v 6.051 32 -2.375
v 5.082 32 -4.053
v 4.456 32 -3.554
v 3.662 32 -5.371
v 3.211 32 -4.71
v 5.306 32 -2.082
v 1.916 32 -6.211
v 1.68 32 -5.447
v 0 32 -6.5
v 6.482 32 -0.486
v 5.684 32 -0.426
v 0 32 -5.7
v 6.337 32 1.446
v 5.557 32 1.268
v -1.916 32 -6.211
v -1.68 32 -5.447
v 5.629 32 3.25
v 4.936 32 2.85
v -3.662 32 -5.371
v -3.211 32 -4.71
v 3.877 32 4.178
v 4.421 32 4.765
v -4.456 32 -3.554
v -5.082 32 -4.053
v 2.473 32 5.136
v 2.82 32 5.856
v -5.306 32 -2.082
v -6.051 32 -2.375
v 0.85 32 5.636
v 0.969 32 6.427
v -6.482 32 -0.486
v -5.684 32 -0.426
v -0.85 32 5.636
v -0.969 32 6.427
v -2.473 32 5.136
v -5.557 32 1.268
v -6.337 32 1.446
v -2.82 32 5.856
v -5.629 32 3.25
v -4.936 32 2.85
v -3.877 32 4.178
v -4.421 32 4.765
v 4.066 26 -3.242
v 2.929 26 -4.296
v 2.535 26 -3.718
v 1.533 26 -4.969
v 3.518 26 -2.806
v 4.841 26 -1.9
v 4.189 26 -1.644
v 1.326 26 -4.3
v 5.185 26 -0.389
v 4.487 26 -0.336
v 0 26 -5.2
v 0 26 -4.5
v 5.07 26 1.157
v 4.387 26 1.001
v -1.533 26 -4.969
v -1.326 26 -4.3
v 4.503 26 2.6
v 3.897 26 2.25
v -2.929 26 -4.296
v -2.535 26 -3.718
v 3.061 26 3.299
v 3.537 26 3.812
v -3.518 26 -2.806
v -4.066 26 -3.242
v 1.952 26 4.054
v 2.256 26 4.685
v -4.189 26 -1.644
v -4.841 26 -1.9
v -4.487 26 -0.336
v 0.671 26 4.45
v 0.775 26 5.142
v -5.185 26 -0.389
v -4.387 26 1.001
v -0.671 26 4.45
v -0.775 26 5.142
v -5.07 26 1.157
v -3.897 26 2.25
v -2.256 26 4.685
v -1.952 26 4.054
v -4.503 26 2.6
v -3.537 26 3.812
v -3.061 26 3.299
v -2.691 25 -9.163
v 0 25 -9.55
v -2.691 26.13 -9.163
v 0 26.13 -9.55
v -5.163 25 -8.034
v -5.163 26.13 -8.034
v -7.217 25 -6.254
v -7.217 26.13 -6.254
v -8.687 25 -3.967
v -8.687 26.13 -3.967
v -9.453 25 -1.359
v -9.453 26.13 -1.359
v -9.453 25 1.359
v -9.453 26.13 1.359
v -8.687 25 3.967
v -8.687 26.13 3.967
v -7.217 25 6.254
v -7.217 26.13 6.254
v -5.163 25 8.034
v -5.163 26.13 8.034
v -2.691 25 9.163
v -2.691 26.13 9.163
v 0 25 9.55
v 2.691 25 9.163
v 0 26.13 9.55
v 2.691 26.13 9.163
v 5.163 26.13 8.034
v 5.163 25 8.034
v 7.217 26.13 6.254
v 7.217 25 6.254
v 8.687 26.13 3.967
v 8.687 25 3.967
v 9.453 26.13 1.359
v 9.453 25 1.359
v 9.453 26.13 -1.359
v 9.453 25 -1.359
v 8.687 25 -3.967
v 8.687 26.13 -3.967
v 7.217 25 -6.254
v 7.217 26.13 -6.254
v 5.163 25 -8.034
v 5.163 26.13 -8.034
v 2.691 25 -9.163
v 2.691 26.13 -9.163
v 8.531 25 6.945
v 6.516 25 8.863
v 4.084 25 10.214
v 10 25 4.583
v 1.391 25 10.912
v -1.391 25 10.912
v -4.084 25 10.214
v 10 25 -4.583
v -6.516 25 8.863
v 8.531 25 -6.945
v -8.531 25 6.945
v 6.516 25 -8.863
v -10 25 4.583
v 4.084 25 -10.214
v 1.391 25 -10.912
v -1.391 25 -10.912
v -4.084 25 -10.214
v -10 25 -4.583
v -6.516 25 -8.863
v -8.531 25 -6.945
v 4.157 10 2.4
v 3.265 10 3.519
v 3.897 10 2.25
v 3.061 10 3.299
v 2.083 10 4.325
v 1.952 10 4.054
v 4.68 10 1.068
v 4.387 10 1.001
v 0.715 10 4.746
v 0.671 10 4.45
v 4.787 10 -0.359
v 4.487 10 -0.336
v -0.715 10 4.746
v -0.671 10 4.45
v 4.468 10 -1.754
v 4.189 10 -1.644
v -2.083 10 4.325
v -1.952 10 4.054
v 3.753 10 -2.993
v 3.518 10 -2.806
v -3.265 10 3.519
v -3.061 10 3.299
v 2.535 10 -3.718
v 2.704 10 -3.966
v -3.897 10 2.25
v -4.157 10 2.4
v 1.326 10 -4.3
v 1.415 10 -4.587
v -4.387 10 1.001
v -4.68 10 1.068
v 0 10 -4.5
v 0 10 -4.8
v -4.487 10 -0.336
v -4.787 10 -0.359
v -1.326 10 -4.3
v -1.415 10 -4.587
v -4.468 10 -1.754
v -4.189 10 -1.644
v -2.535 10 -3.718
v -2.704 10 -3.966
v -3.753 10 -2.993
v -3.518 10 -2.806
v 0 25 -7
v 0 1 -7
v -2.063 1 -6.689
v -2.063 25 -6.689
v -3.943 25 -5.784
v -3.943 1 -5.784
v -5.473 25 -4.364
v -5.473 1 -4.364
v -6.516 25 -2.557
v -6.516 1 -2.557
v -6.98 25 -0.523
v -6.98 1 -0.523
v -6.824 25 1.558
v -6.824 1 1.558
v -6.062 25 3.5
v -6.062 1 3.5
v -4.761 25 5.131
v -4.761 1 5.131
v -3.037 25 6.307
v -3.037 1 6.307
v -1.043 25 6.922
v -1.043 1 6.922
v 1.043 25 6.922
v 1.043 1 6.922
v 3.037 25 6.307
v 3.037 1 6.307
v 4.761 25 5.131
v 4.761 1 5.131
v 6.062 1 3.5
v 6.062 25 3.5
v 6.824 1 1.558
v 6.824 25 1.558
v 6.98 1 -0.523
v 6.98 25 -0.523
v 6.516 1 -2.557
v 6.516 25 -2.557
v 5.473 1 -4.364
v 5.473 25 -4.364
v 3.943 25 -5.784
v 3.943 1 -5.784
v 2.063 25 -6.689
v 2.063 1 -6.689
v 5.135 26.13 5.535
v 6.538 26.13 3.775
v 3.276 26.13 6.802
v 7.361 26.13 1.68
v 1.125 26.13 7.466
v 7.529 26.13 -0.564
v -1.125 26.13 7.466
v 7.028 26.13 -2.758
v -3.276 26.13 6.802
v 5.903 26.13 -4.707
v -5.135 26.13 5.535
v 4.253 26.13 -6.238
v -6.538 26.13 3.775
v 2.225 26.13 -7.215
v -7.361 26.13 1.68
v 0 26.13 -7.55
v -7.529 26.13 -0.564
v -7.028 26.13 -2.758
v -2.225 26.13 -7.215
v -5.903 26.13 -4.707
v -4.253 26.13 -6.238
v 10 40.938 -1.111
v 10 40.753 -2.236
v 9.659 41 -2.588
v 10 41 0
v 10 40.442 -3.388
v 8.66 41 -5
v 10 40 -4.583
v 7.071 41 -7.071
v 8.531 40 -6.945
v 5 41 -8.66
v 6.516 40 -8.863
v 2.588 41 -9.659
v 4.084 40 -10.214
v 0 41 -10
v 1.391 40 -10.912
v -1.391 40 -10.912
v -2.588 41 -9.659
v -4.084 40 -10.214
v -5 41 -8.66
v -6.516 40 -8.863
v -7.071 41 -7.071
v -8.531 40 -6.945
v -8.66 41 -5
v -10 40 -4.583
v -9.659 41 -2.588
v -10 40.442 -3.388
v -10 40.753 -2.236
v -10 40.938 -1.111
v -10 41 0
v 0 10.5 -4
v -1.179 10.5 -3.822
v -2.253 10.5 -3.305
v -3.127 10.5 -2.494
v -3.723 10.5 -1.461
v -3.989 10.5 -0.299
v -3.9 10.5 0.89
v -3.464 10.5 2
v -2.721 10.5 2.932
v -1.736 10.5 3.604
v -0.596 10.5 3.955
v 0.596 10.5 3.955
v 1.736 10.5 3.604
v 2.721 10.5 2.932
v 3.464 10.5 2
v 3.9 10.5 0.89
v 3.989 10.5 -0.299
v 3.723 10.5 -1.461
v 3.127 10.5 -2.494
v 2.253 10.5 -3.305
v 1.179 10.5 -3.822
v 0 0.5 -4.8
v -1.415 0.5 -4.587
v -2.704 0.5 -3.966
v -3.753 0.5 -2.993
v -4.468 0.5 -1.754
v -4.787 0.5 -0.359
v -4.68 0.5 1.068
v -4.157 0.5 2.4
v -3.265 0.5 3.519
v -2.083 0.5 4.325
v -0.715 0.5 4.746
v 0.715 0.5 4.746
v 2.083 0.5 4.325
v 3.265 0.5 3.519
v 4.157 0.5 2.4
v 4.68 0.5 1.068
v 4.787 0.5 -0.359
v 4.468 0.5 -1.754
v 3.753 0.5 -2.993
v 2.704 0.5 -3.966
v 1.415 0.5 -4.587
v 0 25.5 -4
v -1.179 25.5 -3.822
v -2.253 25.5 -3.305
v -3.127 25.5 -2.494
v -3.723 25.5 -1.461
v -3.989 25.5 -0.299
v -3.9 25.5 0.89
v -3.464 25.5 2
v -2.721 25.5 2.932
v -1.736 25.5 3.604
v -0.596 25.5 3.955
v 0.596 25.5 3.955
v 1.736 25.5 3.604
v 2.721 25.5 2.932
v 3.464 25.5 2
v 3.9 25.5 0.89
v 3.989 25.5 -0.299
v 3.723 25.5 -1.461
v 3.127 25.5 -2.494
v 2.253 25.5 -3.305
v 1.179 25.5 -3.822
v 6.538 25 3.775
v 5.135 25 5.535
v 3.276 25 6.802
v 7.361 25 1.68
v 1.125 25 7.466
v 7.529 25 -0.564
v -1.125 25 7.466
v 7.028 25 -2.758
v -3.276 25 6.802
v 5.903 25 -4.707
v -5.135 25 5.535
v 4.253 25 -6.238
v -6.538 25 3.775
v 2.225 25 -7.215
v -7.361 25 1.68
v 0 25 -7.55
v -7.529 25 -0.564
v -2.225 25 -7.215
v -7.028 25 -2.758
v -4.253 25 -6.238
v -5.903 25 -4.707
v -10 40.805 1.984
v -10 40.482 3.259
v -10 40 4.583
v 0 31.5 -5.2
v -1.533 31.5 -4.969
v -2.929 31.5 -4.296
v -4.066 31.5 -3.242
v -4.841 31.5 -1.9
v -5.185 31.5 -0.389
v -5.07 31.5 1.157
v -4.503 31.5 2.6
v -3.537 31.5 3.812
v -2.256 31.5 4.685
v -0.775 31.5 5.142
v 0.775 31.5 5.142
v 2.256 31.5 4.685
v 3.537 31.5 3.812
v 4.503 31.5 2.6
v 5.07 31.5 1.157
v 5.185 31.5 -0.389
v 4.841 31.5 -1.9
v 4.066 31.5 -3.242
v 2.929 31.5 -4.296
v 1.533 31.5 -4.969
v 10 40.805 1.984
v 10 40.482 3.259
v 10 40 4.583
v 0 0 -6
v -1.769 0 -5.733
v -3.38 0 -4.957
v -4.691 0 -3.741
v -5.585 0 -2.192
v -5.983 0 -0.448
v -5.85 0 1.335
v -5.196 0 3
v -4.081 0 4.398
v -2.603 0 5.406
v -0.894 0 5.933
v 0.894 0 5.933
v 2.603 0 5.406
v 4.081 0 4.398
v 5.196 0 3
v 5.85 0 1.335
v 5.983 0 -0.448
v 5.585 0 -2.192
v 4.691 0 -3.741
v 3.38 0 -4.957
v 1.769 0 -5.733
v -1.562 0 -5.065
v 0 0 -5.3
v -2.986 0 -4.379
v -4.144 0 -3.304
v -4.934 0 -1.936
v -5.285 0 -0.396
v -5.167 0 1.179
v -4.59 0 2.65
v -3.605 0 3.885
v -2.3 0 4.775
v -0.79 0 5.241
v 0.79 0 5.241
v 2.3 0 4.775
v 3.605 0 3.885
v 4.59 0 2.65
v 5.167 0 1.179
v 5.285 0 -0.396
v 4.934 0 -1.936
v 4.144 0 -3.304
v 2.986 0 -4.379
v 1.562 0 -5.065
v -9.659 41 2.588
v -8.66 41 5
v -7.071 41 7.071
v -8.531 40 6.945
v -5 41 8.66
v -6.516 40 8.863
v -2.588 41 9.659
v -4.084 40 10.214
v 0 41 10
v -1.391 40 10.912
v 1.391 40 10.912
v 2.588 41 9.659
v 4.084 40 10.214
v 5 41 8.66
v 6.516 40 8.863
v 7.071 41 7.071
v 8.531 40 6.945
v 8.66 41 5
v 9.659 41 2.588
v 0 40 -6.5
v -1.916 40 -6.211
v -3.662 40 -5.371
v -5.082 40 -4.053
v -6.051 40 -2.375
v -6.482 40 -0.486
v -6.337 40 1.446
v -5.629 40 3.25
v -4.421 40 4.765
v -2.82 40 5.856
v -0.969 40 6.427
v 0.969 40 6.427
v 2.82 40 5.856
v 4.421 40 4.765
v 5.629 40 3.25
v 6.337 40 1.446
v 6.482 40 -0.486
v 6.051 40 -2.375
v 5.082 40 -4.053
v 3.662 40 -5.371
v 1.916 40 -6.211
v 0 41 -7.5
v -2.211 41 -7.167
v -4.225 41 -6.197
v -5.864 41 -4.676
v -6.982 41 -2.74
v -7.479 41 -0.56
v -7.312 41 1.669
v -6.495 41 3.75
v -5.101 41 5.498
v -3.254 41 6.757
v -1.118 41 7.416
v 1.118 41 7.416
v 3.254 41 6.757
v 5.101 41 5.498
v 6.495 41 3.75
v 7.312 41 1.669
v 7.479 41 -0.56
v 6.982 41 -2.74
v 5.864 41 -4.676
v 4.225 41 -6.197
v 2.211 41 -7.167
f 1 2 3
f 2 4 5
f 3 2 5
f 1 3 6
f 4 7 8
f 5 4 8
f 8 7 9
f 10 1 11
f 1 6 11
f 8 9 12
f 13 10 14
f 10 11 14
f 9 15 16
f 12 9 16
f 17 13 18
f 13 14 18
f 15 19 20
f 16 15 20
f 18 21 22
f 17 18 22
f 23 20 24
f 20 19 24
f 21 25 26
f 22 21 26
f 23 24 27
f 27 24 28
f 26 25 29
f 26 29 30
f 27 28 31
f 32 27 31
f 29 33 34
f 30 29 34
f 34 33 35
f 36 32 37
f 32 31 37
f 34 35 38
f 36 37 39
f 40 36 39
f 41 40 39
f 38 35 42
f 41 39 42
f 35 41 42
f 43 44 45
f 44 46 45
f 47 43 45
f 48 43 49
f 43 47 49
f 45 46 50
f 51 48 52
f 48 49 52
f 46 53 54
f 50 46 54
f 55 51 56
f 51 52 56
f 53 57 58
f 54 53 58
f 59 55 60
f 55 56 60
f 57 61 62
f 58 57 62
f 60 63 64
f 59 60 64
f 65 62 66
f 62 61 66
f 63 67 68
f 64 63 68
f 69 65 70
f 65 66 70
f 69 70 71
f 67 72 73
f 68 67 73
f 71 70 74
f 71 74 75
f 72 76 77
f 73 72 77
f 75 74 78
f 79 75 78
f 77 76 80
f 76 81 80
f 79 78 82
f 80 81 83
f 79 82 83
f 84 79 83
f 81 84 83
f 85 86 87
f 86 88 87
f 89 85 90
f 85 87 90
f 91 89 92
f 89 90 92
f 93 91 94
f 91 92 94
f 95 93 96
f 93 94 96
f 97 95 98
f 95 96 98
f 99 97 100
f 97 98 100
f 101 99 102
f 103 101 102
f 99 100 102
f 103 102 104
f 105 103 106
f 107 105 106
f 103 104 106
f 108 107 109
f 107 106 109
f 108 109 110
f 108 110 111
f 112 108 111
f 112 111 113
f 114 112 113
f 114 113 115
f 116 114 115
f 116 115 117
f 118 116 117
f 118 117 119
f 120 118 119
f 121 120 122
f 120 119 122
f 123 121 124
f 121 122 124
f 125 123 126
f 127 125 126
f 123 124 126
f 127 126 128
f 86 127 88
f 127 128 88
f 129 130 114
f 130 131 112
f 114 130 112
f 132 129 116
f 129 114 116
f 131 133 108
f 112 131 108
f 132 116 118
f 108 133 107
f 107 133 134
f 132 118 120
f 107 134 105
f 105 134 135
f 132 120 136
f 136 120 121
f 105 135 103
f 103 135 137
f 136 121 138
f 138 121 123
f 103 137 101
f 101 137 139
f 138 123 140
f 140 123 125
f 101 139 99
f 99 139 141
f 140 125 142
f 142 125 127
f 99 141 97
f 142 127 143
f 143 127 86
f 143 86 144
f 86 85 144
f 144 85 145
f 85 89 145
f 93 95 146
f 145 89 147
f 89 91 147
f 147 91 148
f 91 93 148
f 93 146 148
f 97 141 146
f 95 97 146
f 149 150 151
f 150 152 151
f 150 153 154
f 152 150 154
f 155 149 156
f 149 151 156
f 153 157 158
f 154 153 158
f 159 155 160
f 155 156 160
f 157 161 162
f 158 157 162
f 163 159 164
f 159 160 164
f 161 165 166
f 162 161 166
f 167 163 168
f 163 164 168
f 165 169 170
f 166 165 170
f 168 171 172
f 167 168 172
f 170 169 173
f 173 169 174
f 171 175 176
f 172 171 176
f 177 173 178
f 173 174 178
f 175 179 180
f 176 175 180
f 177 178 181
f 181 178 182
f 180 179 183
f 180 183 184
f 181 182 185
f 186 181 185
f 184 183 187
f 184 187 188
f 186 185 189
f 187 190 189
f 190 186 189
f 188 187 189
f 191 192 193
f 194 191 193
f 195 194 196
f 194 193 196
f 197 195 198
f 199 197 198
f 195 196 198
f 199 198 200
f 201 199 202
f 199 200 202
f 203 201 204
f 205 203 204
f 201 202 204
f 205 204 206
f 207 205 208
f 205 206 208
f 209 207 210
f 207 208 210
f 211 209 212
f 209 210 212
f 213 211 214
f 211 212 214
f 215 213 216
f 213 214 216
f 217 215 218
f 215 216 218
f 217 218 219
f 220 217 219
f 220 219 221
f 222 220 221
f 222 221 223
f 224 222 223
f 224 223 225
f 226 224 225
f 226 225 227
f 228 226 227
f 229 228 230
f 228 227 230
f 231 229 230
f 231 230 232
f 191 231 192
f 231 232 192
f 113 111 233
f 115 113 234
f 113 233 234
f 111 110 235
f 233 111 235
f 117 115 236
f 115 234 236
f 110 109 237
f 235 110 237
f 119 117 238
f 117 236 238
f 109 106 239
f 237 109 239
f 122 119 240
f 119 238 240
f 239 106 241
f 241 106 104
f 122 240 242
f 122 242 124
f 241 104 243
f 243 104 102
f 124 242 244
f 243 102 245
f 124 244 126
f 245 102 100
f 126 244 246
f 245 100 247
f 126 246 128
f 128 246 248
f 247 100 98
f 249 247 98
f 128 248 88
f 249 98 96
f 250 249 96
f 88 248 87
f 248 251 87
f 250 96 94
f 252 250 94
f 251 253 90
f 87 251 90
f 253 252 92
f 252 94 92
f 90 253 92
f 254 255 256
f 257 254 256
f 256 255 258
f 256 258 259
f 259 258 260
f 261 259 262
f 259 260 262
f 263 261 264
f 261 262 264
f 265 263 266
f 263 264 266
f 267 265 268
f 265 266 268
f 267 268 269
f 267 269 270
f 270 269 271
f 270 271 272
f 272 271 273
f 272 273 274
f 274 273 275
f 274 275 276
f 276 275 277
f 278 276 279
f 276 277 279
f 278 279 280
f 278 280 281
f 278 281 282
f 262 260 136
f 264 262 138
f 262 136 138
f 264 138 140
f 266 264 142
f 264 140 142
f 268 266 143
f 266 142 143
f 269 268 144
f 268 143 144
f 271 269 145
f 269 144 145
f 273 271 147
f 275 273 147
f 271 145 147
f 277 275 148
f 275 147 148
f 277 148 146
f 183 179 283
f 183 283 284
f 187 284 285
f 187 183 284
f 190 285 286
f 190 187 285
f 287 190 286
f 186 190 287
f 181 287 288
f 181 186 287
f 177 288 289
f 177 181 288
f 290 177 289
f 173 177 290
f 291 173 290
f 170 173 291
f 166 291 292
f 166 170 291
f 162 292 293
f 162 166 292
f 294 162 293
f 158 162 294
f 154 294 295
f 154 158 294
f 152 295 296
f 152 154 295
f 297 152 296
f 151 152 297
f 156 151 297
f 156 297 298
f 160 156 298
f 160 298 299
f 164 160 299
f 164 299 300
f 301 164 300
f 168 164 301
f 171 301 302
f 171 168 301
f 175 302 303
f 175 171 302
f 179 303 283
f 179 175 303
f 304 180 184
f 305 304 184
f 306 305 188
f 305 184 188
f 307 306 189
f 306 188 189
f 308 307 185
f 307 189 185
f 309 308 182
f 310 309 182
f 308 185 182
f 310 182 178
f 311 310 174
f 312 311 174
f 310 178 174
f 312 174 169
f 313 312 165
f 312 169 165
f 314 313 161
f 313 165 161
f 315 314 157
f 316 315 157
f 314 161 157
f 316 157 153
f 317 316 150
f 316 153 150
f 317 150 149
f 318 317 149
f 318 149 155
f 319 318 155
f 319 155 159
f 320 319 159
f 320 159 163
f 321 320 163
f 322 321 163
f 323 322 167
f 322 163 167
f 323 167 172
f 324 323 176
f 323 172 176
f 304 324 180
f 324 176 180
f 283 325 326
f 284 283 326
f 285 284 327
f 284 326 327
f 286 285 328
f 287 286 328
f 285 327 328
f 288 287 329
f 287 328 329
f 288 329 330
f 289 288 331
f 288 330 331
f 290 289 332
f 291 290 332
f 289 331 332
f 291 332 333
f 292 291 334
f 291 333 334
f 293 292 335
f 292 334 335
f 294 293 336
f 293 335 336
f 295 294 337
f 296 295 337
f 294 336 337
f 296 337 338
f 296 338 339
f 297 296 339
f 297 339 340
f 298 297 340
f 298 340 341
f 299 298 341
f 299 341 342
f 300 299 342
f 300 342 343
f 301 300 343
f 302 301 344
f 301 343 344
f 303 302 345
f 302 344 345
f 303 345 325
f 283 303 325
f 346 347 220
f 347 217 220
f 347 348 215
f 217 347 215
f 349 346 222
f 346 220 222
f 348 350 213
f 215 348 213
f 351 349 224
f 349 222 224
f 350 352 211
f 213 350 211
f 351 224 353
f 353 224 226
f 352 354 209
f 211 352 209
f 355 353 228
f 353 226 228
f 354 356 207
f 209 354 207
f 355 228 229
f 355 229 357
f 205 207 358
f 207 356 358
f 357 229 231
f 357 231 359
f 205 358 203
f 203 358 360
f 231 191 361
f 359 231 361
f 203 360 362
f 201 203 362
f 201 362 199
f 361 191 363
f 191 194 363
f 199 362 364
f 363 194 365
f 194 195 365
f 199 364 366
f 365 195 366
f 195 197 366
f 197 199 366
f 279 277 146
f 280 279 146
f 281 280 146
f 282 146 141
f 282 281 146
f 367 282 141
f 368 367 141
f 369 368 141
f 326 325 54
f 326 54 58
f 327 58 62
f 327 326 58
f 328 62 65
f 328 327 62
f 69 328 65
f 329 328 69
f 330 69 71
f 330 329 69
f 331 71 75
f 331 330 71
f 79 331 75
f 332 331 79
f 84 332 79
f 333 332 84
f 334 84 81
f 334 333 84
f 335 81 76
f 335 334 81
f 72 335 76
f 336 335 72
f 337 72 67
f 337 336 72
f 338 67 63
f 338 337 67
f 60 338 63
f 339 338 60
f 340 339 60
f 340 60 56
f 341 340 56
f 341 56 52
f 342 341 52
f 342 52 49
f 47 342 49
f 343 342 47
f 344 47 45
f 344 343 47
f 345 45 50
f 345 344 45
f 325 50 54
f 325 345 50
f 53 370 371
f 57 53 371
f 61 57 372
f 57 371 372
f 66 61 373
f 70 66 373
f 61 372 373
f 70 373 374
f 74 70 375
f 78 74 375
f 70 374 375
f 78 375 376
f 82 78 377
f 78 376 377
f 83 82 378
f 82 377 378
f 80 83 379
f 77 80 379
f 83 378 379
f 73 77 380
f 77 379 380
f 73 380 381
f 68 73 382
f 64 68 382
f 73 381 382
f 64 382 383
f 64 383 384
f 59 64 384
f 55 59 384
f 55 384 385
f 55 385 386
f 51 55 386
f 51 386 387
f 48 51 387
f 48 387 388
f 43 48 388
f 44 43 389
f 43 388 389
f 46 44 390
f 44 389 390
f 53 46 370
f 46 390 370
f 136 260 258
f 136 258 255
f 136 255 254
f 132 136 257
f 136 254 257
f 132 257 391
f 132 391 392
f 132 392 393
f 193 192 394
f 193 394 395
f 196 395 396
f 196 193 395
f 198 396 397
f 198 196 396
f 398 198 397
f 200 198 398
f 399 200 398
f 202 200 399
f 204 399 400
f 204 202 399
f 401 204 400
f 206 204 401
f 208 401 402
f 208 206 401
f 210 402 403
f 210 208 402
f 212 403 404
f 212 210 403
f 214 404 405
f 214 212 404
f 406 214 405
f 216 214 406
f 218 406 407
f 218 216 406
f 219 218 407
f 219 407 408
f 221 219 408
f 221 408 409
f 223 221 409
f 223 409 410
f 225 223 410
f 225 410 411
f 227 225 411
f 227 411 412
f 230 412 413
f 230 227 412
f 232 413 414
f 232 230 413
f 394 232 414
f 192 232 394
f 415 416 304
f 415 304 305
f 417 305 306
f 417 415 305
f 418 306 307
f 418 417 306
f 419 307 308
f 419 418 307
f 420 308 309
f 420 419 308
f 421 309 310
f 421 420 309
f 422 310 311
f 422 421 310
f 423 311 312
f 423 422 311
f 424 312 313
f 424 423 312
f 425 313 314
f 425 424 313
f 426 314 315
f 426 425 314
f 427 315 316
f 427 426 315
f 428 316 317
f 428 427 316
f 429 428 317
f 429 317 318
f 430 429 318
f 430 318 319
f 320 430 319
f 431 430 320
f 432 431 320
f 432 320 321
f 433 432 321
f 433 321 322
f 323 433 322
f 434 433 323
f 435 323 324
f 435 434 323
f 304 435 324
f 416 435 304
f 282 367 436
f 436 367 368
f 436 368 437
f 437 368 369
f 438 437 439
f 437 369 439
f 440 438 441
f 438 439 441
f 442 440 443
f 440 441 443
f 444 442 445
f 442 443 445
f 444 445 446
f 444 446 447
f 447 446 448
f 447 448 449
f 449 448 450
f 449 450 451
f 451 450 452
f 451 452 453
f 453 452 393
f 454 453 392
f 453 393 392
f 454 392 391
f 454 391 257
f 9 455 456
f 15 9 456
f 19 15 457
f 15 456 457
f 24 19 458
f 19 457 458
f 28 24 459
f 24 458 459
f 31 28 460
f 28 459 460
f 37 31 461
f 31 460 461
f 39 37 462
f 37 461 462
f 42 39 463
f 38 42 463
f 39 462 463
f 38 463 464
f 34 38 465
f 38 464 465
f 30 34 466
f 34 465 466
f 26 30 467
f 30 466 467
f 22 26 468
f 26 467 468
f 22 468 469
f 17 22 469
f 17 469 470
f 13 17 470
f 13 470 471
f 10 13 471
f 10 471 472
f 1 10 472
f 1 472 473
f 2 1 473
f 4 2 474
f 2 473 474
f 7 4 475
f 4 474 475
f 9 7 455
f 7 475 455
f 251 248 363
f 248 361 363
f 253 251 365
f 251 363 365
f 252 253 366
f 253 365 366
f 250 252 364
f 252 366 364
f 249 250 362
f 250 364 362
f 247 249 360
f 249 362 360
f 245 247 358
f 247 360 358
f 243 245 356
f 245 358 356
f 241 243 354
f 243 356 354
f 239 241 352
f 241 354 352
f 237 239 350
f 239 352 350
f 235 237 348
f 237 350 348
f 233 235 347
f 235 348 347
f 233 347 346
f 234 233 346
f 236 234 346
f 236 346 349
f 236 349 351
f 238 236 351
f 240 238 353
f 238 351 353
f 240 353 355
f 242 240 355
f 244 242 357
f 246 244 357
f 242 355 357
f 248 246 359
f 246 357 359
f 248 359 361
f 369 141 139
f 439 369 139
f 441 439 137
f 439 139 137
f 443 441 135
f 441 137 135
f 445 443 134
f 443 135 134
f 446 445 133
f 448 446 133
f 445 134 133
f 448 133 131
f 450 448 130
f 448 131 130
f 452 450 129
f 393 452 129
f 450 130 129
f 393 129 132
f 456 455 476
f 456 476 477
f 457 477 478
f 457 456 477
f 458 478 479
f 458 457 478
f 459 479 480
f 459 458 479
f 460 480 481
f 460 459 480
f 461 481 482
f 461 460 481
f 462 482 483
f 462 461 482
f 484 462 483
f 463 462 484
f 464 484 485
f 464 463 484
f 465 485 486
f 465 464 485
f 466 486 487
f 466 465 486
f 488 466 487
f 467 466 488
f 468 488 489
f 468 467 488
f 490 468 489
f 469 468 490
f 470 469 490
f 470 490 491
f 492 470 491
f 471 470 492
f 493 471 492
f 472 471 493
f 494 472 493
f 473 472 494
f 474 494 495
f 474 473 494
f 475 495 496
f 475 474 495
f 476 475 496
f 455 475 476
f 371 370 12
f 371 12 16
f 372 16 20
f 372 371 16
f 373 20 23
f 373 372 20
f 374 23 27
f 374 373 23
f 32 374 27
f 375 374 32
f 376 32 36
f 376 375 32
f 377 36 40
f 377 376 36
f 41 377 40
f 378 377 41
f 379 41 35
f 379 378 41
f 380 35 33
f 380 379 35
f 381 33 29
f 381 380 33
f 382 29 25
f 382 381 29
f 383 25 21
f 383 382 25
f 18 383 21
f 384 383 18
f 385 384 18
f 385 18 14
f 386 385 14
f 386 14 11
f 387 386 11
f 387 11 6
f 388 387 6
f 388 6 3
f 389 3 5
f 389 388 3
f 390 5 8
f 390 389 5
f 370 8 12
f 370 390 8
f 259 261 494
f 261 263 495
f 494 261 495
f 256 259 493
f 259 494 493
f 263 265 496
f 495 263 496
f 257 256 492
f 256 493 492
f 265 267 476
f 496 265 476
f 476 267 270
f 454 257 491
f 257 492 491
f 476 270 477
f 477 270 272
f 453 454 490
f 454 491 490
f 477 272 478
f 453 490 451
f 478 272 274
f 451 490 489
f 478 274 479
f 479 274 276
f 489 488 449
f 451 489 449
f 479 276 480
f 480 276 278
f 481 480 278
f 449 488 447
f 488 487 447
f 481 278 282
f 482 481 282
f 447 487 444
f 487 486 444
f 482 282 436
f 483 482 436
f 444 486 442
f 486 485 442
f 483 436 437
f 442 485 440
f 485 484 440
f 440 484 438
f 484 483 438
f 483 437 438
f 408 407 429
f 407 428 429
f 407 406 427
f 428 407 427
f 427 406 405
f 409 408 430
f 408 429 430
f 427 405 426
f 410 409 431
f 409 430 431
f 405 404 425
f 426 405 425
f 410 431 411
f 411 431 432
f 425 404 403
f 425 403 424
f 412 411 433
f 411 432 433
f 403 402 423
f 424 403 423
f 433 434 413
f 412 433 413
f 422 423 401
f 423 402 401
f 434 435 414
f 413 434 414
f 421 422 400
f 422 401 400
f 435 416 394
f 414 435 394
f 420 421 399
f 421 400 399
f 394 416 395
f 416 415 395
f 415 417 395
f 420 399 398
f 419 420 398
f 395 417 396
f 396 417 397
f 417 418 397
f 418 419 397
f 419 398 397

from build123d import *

# Parameters (mm, degrees)
CHANFREIN3_SIZE         = 1
ENL_V_MAT_EXTRU_1_DEPTH = 44.852023899
CHANFREIN1_SIZE         = 1
CHANFREIN2_SIZE         = 0.5


with BuildPart() as part:
    # Esquisse1 → Révolution1 (revolve)
    with BuildSketch(Plane.XY, mode=Mode.PRIVATE) as r_volution1_sk:
        Polygon((4.8, 10), (4, 10), (4, 26), (5.2, 26), (5.2, 32), (6.5, 32), (6.5, 41), (11, 41), (11, 25), (9.55, 25), (9.55, 26.13), (7.55, 26.13), (7.55, 25), (7, 25), (7, 0), (4.8, 0), align=None)
    revolve(r_volution1_sk.sketch.rotate(Axis((0, 0, 0), (0, 1, 0)), 90), axis=Axis((0, 0, 0), (0, 1, 0)))

    # Chanfrein3
    chanfrein3_edges = [part.edges().sort_by_distance(p)[0] for p in [
        (0, 41, 11),
    ]]
    chamfer(chanfrein3_edges, length=CHANFREIN3_SIZE)

    # Esquisse2 → Enlèv. mat.-Extru.1 (cut, through all)
    with BuildSketch(Plane(origin=(0, 41, 0), x_dir=(1, 0, 0), z_dir=(0, 1, 0))):
        with BuildLine():
            Line((-10, 4.582575695), (-10, -4.582575695))
            ThreePointArc((-10, -4.582575695), (-11, 0), (-10, 4.582575695))
        make_face()
        with BuildLine():
            Line((10, 4.582575695), (10, -4.582575695))
            ThreePointArc((10, -4.582575695), (11, 0), (10, 4.582575695))
        make_face()
    extrude(amount=-ENL_V_MAT_EXTRU_1_DEPTH, mode=Mode.SUBTRACT)

    # Chanfrein1
    chanfrein1_edges = [part.edges().sort_by_distance(p)[0] for p in [
        (0, 41, 6.5),
        (0, 0, 7),
    ]]
    chamfer(chanfrein1_edges, length=CHANFREIN1_SIZE)

    # Chanfrein2
    chanfrein2_edges = [part.edges().sort_by_distance(p)[0] for p in [
        (0, 10, 4),
        (0, 26, 4),
        (0, 32, 5.2),
        (0, 0, 4.8),
    ]]
    chamfer(chanfrein2_edges, length=CHANFREIN2_SIZE)


solid = part.part
